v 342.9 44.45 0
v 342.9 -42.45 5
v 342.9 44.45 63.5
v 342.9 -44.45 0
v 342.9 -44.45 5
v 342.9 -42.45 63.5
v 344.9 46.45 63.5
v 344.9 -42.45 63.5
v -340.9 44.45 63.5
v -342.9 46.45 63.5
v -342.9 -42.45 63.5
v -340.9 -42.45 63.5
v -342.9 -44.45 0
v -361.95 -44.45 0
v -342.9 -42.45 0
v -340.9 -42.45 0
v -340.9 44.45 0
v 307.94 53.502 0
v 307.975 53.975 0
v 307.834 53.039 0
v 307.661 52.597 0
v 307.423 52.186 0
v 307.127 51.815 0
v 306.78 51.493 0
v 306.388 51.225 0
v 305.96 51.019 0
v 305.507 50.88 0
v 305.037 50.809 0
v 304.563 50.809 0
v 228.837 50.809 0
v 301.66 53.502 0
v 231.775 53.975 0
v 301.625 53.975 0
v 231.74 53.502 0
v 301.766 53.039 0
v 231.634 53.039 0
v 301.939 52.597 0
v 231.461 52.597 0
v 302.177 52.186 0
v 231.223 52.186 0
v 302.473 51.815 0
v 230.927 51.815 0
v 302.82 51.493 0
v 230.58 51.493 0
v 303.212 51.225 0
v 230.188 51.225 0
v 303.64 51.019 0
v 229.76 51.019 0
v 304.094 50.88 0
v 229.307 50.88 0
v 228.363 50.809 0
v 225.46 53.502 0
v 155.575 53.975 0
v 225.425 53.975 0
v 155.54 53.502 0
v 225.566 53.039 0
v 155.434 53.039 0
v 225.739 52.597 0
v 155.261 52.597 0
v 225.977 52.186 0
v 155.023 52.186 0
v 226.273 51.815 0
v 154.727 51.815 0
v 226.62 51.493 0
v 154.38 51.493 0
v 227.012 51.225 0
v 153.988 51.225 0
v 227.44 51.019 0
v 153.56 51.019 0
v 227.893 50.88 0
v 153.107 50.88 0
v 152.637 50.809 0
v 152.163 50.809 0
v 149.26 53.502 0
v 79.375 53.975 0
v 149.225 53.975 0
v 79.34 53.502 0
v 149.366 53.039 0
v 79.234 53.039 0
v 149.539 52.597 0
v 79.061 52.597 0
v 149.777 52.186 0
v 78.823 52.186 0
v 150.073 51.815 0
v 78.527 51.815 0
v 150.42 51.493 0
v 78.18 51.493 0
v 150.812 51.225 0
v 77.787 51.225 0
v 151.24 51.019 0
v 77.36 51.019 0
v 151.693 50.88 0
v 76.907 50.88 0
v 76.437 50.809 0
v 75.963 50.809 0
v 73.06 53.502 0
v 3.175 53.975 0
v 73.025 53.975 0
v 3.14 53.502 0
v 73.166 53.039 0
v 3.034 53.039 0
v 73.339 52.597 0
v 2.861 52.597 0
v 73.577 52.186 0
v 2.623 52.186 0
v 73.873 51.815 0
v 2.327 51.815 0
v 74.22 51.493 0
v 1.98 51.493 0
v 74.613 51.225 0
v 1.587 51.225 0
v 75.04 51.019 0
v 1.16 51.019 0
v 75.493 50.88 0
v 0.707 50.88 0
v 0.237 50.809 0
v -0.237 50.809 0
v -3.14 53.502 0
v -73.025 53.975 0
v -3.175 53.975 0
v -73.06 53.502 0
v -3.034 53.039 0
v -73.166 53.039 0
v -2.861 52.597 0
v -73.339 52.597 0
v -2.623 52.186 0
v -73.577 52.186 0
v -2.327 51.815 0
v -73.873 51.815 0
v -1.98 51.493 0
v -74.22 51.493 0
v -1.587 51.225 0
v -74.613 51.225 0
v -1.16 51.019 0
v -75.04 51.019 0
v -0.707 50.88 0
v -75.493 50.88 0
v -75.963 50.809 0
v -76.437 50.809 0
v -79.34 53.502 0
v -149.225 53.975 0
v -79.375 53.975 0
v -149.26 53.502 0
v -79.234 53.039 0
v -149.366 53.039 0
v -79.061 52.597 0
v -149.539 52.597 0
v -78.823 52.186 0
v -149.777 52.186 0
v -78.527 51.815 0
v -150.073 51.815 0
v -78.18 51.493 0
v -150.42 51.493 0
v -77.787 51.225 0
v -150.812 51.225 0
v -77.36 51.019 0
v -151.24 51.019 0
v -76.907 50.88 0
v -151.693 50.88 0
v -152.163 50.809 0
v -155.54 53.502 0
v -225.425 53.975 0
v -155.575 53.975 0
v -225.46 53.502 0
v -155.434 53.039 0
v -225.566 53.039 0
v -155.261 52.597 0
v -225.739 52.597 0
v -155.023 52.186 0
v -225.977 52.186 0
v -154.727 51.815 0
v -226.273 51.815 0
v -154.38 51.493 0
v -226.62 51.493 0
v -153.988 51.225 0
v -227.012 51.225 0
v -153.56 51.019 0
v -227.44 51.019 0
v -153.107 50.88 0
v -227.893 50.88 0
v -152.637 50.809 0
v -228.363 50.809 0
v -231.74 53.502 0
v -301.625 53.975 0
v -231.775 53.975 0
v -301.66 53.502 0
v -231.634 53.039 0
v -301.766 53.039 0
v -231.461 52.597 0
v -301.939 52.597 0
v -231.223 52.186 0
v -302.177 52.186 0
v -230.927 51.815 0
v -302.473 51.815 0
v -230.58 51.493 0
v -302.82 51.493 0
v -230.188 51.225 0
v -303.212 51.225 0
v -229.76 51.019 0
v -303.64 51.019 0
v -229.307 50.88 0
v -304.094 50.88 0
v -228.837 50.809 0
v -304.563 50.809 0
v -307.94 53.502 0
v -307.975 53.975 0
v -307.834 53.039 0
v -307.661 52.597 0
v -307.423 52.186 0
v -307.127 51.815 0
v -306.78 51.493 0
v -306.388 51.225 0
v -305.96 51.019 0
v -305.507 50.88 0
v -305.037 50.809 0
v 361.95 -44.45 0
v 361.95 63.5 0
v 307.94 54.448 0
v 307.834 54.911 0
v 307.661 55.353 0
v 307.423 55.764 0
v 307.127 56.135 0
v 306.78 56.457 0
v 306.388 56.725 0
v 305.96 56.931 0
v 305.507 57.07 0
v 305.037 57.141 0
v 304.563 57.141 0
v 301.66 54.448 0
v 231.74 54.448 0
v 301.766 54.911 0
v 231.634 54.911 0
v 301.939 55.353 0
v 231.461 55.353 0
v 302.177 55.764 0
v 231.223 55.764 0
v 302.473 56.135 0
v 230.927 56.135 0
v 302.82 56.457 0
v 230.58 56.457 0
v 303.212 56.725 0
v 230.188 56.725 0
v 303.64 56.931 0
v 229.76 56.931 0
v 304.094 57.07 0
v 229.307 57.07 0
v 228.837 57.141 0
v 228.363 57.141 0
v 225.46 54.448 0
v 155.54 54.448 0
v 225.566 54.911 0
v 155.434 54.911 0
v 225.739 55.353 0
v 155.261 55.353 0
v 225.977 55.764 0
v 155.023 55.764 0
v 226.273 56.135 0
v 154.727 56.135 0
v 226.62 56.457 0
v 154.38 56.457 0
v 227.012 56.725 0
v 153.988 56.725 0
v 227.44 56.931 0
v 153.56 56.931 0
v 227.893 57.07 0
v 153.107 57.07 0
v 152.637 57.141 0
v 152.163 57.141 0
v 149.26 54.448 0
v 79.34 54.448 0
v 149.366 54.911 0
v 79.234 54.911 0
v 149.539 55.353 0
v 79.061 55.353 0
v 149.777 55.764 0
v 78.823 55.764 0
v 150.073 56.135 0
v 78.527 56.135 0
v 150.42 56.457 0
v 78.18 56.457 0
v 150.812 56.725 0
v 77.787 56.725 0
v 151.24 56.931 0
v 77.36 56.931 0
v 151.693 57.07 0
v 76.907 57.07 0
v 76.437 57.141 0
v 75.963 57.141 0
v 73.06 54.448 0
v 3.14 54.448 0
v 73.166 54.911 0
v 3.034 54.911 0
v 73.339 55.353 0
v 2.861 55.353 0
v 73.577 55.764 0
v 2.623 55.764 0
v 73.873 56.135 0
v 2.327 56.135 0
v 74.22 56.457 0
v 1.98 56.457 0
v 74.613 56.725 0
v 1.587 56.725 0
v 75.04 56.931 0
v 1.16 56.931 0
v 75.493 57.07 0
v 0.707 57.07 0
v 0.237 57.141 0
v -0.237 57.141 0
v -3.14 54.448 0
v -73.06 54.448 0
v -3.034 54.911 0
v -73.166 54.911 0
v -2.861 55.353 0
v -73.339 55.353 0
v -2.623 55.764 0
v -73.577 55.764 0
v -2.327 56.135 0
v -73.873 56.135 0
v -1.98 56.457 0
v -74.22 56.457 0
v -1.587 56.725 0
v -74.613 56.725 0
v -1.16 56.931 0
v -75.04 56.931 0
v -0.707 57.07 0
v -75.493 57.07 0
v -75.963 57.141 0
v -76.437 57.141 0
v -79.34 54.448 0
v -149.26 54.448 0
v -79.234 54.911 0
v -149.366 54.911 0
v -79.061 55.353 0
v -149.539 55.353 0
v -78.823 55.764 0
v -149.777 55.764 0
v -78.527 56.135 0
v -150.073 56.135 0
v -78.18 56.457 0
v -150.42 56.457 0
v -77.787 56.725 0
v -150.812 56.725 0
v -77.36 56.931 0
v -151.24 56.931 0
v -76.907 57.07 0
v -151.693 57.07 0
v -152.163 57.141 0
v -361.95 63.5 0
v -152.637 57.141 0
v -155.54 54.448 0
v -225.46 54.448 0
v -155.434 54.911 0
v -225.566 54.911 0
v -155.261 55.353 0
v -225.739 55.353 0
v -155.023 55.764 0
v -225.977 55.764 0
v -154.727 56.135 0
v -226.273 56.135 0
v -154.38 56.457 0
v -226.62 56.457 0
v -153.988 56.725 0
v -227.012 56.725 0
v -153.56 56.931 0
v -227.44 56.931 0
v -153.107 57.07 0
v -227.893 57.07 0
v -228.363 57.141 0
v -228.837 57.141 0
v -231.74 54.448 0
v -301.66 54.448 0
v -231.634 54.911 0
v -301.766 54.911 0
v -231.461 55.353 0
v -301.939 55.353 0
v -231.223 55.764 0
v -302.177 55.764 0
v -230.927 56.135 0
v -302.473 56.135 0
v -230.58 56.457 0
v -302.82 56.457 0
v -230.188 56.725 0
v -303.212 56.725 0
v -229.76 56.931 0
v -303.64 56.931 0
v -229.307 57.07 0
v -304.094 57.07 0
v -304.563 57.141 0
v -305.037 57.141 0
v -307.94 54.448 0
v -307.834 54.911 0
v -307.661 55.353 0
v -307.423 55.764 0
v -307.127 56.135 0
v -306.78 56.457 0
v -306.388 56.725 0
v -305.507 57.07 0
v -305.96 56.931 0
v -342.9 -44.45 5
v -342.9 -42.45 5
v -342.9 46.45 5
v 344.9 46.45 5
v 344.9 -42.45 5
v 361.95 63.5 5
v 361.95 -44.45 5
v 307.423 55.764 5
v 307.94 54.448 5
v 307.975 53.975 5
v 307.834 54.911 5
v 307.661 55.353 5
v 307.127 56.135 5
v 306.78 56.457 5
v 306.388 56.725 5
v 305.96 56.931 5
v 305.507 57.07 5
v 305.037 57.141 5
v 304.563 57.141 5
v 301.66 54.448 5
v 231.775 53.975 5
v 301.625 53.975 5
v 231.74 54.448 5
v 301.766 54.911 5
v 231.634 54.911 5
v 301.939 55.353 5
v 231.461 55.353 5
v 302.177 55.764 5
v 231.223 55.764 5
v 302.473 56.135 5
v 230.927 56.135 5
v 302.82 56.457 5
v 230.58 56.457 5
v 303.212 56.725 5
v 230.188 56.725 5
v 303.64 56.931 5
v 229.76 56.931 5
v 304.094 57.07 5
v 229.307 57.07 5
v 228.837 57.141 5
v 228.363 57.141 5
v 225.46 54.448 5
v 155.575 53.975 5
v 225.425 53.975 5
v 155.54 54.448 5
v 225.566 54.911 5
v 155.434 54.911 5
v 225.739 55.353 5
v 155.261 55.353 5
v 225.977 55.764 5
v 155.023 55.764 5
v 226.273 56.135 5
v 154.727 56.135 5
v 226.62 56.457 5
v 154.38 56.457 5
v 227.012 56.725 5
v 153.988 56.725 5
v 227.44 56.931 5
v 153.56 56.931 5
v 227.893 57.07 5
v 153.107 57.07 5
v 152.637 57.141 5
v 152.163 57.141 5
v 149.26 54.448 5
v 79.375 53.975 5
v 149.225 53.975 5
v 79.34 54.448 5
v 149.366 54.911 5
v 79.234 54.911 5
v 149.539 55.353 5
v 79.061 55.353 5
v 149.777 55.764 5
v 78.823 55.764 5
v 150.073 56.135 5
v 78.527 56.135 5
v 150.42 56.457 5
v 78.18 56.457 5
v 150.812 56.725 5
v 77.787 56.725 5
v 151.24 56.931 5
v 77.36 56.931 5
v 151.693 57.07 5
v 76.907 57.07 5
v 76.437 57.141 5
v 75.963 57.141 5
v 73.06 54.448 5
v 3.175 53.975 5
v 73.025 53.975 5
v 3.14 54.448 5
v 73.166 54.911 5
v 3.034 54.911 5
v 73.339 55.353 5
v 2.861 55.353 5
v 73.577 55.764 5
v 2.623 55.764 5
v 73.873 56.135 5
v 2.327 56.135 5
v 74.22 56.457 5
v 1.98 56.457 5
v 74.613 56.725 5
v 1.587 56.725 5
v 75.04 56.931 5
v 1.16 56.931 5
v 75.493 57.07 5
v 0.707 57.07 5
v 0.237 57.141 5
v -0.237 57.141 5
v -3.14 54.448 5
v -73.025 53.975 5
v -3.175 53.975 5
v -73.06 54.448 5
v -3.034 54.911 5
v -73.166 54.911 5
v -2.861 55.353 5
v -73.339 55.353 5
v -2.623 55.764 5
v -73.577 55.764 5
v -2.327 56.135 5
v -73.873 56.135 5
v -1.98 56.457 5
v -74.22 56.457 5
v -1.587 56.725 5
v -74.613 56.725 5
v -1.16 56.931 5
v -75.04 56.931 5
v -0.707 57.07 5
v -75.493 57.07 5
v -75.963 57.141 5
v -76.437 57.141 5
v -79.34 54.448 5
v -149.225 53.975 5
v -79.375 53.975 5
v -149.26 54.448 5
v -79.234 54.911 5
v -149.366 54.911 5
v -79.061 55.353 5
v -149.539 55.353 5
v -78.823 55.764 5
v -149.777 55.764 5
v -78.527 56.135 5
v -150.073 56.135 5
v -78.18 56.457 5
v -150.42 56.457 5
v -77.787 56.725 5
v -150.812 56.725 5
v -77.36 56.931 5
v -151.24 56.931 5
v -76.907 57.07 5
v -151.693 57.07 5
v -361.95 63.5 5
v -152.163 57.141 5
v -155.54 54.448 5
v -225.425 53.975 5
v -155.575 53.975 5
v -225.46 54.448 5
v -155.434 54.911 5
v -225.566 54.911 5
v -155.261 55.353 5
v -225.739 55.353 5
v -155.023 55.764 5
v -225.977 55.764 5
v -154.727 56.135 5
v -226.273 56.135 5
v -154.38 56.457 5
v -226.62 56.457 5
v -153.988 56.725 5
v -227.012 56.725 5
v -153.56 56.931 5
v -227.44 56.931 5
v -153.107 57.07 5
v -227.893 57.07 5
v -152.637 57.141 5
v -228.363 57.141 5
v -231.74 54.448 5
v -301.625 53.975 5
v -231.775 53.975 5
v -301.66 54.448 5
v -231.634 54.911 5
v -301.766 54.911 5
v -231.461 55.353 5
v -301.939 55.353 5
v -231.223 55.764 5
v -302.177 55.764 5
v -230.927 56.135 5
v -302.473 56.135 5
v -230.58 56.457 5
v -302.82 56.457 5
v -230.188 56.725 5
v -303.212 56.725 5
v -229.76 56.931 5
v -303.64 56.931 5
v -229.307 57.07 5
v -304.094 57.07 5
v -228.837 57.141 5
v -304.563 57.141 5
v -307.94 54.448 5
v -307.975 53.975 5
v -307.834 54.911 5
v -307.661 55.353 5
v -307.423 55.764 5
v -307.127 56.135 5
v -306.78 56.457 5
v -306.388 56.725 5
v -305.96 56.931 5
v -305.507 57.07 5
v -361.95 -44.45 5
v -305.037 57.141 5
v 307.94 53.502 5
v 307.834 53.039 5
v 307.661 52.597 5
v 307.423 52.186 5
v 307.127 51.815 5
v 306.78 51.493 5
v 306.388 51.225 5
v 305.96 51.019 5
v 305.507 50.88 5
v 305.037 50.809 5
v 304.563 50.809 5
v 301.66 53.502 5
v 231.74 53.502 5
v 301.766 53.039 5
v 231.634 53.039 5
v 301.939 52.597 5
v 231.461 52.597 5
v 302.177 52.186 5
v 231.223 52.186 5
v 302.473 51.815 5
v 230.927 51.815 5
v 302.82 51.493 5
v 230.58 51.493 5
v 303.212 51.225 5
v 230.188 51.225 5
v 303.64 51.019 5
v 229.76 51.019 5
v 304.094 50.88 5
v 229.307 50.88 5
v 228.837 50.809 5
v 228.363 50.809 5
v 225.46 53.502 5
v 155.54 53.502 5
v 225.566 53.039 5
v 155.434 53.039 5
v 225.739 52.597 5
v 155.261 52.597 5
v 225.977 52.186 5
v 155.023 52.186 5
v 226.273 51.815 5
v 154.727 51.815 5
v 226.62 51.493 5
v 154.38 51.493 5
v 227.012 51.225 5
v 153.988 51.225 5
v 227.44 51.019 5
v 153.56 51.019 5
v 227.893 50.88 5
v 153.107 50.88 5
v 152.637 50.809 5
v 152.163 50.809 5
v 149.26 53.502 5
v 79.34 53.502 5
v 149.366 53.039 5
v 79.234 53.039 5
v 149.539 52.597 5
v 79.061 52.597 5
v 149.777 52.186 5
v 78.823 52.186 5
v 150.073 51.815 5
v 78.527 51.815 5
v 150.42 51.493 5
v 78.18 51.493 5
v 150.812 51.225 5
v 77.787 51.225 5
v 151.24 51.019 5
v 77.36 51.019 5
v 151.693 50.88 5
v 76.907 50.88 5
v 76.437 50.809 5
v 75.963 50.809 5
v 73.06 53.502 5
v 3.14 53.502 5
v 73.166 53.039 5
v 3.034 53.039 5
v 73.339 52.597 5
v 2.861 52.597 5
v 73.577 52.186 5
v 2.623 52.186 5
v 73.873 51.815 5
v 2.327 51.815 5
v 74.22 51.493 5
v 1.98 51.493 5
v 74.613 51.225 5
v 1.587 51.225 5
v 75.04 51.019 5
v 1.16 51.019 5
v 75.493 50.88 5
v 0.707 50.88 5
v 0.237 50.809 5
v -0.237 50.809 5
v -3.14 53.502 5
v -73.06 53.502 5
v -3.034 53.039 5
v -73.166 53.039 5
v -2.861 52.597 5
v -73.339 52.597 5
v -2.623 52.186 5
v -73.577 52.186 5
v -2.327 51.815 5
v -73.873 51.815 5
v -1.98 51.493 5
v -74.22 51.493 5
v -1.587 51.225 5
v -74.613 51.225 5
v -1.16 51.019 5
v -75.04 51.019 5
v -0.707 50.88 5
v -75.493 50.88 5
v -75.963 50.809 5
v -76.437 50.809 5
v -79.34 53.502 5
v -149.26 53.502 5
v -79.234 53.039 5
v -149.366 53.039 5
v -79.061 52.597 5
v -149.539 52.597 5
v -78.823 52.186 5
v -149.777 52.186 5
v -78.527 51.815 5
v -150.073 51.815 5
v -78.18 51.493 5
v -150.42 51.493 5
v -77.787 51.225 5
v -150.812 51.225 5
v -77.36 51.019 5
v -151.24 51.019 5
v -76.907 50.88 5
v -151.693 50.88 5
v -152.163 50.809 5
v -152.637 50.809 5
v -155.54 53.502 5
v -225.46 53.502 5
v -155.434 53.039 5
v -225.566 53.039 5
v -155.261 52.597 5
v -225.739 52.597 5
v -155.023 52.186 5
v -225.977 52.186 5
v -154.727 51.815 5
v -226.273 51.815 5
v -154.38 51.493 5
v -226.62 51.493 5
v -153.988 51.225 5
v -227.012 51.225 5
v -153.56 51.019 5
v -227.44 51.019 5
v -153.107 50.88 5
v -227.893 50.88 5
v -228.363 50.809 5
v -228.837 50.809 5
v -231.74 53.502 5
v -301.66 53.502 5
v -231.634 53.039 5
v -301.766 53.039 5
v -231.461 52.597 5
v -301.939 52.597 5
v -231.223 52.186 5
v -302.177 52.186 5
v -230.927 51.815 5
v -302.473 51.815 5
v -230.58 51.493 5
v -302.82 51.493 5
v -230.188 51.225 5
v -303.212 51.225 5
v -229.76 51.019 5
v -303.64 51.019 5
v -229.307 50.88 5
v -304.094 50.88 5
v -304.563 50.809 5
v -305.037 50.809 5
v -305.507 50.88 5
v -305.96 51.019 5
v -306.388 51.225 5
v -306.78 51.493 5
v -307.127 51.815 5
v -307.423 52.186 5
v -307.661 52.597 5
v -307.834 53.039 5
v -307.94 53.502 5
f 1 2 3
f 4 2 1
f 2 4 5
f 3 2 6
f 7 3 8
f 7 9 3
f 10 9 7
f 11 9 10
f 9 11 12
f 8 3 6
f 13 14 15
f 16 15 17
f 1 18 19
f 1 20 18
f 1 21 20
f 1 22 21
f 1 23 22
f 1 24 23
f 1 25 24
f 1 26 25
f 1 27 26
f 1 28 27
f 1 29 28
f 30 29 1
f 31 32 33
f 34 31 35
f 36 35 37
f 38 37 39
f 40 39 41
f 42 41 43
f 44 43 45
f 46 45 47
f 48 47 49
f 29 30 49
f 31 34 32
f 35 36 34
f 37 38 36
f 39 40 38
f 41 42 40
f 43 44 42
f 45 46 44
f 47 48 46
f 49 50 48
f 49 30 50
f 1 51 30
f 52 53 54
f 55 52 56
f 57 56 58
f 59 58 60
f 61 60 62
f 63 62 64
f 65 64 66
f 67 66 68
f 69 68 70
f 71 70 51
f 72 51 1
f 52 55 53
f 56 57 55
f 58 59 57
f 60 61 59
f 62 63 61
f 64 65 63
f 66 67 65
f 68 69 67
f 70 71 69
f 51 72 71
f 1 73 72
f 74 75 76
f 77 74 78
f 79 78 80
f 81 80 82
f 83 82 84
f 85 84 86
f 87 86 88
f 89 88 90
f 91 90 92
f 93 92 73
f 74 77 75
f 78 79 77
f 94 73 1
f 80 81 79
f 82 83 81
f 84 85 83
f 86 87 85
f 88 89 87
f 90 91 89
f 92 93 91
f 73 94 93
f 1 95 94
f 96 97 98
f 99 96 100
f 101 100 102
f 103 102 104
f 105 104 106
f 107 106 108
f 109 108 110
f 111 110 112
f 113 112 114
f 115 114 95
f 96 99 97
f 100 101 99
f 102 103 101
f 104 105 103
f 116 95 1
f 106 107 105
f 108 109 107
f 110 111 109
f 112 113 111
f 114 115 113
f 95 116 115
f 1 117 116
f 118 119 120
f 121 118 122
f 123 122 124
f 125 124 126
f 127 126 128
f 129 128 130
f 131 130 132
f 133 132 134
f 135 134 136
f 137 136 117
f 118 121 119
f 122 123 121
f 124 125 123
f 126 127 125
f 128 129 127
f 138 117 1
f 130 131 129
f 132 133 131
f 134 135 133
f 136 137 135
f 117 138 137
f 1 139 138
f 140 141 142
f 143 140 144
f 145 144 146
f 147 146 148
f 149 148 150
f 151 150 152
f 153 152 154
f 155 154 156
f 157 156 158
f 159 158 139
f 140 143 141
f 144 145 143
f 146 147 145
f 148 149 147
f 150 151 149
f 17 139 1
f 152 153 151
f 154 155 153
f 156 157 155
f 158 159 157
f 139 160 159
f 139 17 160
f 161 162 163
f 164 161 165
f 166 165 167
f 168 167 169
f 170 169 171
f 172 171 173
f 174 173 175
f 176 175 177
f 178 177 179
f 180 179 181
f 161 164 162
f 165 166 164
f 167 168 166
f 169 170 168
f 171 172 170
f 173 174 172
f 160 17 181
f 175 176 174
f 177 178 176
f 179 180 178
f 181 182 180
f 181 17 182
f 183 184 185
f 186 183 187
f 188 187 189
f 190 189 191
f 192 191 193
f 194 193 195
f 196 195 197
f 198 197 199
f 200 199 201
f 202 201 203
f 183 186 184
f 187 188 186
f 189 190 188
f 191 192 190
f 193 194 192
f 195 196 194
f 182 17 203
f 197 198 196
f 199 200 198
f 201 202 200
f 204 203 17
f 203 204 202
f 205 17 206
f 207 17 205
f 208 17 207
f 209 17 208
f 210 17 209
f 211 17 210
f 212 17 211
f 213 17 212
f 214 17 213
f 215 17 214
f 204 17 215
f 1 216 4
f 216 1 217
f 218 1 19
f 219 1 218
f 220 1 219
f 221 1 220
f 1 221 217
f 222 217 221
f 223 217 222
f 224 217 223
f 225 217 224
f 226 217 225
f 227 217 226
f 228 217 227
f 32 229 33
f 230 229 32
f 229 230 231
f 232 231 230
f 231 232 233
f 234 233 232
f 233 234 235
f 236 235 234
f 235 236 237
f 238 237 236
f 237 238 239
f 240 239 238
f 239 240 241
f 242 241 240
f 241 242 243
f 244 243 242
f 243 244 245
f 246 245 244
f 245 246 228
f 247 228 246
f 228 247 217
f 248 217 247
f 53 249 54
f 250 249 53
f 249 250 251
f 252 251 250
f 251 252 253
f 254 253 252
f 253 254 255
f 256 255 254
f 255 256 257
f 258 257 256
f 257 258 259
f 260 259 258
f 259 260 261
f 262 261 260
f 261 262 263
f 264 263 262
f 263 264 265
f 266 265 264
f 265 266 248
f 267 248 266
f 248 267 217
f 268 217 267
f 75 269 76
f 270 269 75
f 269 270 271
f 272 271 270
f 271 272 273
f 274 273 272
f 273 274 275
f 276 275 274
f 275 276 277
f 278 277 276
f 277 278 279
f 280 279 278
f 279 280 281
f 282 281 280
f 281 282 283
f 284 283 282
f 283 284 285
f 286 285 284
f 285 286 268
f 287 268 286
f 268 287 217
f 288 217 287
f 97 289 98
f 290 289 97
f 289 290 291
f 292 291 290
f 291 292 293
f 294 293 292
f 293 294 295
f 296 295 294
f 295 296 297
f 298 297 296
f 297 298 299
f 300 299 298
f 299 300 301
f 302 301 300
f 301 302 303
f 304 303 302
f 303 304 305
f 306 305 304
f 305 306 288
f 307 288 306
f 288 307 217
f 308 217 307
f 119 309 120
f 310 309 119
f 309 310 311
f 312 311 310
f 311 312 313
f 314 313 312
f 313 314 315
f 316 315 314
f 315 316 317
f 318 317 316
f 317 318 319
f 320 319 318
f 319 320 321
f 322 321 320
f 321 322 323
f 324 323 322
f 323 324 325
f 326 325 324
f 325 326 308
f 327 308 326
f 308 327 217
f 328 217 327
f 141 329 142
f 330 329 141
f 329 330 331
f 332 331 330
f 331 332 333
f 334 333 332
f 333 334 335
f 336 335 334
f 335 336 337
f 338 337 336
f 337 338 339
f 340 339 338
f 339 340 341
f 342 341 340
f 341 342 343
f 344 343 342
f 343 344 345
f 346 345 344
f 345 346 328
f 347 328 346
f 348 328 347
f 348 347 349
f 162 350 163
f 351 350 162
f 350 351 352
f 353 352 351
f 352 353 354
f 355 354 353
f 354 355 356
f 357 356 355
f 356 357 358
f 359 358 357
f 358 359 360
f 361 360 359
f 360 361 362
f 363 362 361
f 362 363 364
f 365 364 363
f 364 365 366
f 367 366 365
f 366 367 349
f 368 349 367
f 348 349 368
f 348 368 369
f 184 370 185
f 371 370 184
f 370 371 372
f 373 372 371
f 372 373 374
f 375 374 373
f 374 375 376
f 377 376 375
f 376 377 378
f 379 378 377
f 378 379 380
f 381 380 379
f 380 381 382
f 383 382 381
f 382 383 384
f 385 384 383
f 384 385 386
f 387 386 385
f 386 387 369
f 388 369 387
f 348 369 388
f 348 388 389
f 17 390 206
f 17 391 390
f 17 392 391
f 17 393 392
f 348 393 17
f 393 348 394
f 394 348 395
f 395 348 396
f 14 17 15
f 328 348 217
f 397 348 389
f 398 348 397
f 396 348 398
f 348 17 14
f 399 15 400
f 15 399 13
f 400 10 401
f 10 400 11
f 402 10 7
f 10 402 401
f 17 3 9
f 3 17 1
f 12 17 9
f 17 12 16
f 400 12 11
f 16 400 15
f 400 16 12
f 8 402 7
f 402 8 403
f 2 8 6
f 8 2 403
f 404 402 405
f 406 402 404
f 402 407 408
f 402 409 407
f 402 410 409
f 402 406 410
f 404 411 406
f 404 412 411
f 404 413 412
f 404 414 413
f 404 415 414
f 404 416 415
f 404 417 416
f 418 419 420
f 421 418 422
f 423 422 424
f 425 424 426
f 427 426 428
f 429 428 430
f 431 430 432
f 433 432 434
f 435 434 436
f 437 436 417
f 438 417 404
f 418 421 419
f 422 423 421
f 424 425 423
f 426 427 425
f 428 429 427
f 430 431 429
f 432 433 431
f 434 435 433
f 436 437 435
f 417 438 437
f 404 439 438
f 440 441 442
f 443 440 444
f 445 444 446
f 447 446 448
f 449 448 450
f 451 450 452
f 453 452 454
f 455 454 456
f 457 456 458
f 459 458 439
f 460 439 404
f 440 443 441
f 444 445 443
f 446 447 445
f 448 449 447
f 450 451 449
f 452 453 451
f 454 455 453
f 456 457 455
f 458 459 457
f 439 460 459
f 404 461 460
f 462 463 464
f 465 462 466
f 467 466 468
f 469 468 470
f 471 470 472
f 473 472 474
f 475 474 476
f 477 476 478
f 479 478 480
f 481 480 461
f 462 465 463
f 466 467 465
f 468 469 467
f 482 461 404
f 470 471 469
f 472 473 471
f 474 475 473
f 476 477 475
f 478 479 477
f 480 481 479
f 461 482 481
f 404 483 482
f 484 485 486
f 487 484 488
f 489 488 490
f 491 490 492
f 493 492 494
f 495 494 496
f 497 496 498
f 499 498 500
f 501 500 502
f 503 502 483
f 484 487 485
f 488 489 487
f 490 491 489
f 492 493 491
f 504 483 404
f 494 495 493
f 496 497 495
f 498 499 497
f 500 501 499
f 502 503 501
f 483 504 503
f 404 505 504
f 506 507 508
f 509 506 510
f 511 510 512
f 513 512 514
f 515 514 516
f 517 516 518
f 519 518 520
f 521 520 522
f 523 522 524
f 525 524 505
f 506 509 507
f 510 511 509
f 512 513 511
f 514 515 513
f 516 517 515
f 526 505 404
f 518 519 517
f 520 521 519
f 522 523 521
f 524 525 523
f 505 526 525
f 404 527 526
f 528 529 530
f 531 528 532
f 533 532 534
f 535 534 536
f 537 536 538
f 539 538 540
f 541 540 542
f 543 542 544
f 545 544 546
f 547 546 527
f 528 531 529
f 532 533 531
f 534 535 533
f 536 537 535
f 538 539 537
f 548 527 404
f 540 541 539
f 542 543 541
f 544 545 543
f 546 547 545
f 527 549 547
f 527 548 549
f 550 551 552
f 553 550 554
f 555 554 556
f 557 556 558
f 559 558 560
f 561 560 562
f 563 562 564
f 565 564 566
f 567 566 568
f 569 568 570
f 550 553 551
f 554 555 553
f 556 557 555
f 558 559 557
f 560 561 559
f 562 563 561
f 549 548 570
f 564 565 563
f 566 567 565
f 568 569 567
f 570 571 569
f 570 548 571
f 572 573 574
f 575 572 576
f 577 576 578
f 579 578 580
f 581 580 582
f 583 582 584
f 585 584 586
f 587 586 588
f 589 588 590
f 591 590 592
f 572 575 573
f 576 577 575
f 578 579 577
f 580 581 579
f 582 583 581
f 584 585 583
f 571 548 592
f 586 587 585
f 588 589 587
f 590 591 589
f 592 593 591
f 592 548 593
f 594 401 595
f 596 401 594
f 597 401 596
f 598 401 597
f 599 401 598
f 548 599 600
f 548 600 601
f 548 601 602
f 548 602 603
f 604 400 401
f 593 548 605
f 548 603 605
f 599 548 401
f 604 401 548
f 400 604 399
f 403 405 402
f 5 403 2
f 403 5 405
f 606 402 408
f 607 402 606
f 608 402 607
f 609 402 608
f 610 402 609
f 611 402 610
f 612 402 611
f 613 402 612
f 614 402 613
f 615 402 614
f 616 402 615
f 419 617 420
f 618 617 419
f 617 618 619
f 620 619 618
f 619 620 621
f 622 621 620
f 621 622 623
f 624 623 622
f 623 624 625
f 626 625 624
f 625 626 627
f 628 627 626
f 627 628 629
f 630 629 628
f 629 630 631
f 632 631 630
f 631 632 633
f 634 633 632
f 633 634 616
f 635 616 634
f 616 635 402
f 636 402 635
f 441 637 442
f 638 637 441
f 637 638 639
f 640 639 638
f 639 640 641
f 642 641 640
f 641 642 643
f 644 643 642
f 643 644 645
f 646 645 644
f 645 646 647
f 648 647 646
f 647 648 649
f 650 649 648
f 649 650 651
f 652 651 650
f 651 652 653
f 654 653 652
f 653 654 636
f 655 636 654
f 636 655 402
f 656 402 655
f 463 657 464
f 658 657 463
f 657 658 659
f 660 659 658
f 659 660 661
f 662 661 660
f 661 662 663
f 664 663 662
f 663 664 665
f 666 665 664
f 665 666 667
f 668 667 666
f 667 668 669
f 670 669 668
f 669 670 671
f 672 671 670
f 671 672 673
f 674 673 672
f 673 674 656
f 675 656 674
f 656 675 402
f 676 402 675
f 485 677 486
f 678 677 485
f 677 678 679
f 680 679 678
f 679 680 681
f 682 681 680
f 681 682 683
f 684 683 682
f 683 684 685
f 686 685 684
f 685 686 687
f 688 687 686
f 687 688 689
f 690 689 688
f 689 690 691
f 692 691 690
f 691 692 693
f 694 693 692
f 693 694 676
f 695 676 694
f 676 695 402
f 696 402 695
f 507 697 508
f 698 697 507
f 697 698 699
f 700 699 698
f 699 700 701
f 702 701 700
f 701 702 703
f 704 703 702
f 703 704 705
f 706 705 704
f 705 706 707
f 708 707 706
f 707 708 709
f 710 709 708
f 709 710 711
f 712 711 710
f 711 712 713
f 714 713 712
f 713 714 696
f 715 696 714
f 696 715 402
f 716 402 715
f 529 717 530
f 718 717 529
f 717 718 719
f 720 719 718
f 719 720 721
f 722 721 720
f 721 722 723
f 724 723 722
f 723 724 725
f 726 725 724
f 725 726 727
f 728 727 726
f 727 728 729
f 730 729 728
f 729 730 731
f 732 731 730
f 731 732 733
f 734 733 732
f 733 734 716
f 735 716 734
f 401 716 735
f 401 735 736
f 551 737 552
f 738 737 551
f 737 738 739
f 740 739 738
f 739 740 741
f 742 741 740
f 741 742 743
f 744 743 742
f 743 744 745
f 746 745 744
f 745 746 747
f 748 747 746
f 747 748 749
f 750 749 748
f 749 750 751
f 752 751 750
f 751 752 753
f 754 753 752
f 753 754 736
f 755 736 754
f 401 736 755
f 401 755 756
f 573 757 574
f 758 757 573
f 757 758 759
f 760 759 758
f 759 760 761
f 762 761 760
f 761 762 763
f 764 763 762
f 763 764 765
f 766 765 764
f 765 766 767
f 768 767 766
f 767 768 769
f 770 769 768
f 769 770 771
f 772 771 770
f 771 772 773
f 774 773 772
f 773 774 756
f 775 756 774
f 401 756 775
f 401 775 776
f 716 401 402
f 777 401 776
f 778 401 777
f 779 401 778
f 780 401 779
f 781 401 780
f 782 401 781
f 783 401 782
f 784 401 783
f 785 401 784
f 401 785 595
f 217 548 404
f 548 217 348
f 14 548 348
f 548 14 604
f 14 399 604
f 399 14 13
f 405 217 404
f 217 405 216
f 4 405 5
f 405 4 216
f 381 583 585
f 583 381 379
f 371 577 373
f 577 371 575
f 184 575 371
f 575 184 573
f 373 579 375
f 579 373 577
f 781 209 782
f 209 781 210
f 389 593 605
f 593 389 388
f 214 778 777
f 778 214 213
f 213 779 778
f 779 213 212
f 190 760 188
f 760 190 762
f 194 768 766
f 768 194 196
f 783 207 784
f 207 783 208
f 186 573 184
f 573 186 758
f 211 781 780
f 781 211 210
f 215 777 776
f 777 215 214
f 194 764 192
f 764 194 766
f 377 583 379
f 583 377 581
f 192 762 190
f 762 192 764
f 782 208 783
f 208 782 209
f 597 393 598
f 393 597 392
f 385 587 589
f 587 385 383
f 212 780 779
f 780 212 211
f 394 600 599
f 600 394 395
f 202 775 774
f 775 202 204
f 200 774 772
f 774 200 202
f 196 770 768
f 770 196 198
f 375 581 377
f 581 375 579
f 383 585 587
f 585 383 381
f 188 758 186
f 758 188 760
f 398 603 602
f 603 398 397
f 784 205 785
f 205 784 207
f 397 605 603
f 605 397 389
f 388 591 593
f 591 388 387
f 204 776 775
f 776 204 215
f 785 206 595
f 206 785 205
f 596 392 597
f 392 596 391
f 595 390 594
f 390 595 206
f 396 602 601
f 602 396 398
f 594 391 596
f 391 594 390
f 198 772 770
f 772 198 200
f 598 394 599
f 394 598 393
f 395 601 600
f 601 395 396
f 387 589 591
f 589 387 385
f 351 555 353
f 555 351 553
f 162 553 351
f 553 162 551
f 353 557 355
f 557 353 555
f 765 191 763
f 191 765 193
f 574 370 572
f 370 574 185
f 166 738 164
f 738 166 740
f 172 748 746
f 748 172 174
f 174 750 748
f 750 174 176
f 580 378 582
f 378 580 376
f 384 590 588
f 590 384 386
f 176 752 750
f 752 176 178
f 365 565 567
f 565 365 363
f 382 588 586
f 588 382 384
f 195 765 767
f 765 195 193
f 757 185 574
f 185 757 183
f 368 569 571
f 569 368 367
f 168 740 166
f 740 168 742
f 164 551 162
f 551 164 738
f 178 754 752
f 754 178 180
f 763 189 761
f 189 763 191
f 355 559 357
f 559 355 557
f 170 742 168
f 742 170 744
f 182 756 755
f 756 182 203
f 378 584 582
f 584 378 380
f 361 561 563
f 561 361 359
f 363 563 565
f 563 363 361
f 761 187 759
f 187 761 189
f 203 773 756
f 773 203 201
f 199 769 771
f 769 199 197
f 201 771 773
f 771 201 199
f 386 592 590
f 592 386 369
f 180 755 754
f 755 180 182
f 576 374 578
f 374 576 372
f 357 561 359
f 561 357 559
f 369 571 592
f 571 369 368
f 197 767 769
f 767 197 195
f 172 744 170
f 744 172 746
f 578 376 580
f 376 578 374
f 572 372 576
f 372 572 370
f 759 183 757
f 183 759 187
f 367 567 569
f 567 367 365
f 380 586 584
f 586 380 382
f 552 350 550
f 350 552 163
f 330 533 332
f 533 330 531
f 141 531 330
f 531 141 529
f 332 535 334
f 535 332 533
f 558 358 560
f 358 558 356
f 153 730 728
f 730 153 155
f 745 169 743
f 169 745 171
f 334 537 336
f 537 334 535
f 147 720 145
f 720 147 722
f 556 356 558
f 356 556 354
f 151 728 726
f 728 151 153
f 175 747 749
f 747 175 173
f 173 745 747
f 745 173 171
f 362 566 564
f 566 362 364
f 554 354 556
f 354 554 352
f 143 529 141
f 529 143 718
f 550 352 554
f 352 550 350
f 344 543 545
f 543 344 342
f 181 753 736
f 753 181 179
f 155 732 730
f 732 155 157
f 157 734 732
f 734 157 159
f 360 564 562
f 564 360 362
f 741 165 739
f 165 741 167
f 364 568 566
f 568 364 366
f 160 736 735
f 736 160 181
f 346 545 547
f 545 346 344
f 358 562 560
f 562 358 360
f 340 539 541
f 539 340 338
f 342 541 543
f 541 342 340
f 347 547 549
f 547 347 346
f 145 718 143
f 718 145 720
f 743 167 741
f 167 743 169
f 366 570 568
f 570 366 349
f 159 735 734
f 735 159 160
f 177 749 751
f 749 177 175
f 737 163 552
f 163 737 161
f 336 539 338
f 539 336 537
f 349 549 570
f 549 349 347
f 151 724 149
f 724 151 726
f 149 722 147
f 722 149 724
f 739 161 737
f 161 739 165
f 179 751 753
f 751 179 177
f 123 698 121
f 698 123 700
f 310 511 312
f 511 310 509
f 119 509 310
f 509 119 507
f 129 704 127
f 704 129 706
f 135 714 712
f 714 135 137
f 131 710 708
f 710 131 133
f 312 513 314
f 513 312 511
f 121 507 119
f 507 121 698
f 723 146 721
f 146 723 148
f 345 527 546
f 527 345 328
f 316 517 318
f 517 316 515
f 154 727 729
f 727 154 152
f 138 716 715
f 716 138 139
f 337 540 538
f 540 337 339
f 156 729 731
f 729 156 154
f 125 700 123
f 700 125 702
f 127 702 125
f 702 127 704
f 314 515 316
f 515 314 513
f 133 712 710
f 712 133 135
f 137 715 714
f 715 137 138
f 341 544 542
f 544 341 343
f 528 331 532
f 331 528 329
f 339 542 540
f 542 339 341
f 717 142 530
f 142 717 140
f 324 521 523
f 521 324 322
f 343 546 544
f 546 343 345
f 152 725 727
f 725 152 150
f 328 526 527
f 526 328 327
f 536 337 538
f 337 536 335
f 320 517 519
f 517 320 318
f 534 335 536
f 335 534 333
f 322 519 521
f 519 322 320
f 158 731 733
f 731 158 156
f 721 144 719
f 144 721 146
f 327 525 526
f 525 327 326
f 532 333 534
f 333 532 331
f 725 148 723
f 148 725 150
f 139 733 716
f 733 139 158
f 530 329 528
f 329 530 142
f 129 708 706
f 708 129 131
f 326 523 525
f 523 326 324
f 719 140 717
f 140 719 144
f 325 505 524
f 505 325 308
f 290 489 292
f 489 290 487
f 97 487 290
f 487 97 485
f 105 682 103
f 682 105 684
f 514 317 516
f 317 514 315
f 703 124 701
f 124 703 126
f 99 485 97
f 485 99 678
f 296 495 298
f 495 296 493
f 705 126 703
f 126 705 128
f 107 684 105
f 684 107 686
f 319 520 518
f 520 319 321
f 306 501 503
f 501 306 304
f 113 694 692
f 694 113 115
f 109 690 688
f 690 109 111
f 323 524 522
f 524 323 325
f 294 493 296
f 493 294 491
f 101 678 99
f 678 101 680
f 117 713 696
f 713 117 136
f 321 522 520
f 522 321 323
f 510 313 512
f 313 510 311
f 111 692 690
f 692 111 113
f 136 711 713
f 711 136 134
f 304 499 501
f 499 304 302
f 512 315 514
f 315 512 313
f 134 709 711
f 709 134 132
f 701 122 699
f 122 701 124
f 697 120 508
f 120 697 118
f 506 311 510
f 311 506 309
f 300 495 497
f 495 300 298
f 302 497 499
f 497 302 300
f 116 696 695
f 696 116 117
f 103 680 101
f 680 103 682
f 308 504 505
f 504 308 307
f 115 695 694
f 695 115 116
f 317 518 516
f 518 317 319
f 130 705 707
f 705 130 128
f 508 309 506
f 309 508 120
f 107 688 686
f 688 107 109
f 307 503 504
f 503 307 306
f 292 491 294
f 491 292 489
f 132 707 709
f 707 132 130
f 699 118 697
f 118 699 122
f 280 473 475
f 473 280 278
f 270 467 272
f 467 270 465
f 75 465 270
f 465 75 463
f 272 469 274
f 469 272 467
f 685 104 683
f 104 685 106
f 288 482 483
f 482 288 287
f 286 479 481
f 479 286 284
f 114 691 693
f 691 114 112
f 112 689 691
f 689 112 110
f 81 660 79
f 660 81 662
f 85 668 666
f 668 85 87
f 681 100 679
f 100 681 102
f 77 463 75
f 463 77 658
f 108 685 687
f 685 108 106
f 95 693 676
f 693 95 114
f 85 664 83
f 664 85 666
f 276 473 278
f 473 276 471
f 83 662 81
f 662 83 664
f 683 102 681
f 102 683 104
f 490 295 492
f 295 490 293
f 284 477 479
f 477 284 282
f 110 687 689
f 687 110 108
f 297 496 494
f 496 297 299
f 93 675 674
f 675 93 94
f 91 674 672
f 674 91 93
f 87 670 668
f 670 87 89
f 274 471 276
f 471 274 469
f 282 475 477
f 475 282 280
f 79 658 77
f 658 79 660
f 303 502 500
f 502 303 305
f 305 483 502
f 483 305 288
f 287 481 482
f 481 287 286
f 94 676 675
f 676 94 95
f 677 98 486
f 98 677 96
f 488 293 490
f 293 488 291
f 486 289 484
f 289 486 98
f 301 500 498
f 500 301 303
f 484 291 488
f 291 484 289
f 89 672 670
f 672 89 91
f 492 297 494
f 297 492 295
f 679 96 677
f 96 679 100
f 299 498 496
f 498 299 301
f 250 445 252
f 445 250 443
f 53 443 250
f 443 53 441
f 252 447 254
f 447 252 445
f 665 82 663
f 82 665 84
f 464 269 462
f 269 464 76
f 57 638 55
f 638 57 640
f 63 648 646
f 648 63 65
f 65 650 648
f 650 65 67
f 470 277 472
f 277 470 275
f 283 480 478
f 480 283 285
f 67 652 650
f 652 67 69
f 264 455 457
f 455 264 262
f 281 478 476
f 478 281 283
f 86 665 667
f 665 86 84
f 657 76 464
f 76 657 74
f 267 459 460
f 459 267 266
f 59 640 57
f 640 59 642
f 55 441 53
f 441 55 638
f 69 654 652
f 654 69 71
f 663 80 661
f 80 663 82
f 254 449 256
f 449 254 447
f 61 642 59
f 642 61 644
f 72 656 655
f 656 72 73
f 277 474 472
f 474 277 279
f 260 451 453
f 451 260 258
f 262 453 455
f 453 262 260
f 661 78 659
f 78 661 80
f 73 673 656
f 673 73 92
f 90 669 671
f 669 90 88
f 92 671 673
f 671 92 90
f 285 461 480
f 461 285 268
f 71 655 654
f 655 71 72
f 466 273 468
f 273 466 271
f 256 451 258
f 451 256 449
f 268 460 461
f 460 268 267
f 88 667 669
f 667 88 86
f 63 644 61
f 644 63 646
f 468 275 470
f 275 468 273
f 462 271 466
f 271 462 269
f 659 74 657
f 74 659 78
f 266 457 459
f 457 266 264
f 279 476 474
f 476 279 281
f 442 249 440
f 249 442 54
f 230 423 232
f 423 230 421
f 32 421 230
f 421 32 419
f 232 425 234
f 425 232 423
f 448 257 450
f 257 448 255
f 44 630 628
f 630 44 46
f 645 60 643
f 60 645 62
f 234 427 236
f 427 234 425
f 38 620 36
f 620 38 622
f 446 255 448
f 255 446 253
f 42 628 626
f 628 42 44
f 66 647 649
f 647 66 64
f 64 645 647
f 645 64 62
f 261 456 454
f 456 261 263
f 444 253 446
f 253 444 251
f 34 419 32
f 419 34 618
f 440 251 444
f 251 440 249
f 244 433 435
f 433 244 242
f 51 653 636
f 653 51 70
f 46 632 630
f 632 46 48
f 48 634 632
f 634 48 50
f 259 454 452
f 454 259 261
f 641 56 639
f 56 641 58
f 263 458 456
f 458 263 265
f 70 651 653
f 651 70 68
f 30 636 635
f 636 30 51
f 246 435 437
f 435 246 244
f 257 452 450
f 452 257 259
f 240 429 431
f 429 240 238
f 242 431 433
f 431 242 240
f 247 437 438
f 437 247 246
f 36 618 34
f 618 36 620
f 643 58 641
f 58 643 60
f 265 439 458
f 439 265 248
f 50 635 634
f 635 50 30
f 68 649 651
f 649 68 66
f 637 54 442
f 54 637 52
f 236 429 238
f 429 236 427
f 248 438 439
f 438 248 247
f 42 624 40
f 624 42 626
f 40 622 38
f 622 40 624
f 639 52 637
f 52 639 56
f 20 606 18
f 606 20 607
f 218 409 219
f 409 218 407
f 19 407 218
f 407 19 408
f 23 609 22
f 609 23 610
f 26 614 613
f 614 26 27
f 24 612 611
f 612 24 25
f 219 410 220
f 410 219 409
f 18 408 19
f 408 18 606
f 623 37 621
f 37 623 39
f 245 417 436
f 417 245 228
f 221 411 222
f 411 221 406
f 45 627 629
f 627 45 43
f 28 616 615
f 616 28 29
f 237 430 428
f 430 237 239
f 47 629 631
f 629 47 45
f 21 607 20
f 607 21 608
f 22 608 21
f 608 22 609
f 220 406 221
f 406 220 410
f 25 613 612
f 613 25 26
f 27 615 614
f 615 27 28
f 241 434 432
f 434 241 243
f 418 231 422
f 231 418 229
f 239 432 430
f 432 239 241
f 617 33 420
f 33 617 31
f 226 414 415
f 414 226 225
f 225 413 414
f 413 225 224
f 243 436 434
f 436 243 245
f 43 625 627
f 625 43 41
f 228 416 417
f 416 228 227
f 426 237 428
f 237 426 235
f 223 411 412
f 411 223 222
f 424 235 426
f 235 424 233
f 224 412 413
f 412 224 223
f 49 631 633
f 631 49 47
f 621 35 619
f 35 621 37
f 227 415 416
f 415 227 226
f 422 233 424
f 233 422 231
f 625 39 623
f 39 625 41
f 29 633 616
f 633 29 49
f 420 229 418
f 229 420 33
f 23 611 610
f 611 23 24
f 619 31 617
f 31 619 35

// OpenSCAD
// file: lib/chamfer3d.scad
       
//-----------------------------------------------
// Create a chamfer between two or more surfaces
//
// A subset of surface pairs may be specified
//
// Call with N = List of surface subsets
//           N = [[child#,child#],[child#,child#,]...]
//           for 2 objects N = [[0,1]]
//           for 3 objects intersection 0 and 1 N = [[0,1],[0,2]]
// dr = chamfer height (approx)
//       if dr > 0 minkowski() children(); sphere(r=dr) is used
//          dr <= 0 surface is extended via 6 way translation
//
// ** Expand_3d may be modified to use a centered cube rather than a sphere
//
module Chamfer_3d(N,dr=-.5) {
   children();
   
   if (N != undef) { 
      
   for (i=N) {
      hull() {
         intersection() {
            children(i[0]);
            Expand_3d(dr) 
            children(i[1]);
         }
         
         intersection() {
            Expand_3d(dr) 
            children(i[0]);
            children(i[1]);
         }
      }
   }

   } else {
      
      for (i=[0:$children-1]) {
         for (j=[0:$children-1]) {            
            if (i!=j) 
            hull() {
               intersection() {
                  Expand_3d(dr)
                  children(i); 
                  children(j);
               }
               intersection() {
                  children(i); 
                  Expand_3d(dr)
                  children(j);
               }
            }
         } 
      }
   }
}

//--------------------------------------------------
// Expand a child object by shifting or minkowski
// Since the center of an object is not known, 
//     a simple scale(S) children() is not possible
//
// An object can be expanded by creating a composite object
// either using minkowski() children(); sphere(r),cube(r,center=true) etc.
// or by shifting the object on multiple axis
//
// Call with dr = absolute expansion
//           dr <= 0 = use shifting +-dr on each axis.
//           dr >  0 = use minkowski() children(), sphere(dr)
//
module Expand_3d(dr = -.5) {
   if (dr < 0) {
   
      translate([dr,0])
      children();
      translate([-dr,0])
      children();
      translate([0,dr])
      children();
      translate([0,-dr])
      children();
      translate([0,0,dr])
      children();
      translate([0,0,-dr])
      children();
      
   } else {
      minkowski() {
         children();
         sphere(r=dr);
         //cube(dr,center=true);
      }
   }
}
// main file
include <lib/chamfer3d.scad>

function in2mm(dim) = dim * 25.4;

//unitless quantities
number_mounts = 9; //number of holes along the length of the shade, inclusive of the first and last hole

// z axis pointing out of the floor
// x axis along the face of the desk
// y axis going into the face of the desk

//units in inches
mounting_pitch_in = 3;
mount_hole_dia_in = 0.25;
lamp_z_in=2.5;
lamp_y_in=3.5;


//convert to mm
mounting_pitch = in2mm(mounting_pitch_in);
mount_hole_dia = in2mm(mount_hole_dia_in);
lamp_z = in2mm(lamp_z_in);
lamp_y = in2mm(lamp_y_in);
shade_x = mounting_pitch*number_mounts;
shade_thickness = 2;
base_thickness = 5;
mount_y = mount_hole_dia*3;
$fn=42;


translate([-shade_x/2, -lamp_y/2, 0]) //just for display
difference() { 
    union() {
            color("red") //front shade body
                translate([0,lamp_y,0])
                    cube([shade_x, shade_thickness, lamp_z]);
            
            color("purple") //right side shade body(when installed)
                translate([0,shade_thickness,0])
                    cube([shade_thickness, lamp_y, lamp_z]);

            color("blue") //left side shade body(when installed)
                translate([shade_x,shade_thickness,0])
                    cube([shade_thickness, lamp_y, lamp_z]);
        
            color("green") //front side mounting lip
                translate([0,lamp_y,0])
                    cube([shade_x, mount_y, base_thickness]);
        
            color("lightgreen") //right side structural lip
                translate([-1*mount_y,0,0])
                    cube([mount_y, mount_y + lamp_y, base_thickness]);
        
            color("darkgreen") //left side structural lip
                translate([shade_x,0,0])
                    cube([mount_y, mount_y + lamp_y, base_thickness]);
                
    }
    
    //mounting hole array
    for( x = [mounting_pitch/2 : mounting_pitch : shade_x]) {
        color("black")
        translate([x,mount_y/2 + lamp_y, -1])
            cylinder(h = base_thickness * 4, r = mount_hole_dia/2);
    }
}
